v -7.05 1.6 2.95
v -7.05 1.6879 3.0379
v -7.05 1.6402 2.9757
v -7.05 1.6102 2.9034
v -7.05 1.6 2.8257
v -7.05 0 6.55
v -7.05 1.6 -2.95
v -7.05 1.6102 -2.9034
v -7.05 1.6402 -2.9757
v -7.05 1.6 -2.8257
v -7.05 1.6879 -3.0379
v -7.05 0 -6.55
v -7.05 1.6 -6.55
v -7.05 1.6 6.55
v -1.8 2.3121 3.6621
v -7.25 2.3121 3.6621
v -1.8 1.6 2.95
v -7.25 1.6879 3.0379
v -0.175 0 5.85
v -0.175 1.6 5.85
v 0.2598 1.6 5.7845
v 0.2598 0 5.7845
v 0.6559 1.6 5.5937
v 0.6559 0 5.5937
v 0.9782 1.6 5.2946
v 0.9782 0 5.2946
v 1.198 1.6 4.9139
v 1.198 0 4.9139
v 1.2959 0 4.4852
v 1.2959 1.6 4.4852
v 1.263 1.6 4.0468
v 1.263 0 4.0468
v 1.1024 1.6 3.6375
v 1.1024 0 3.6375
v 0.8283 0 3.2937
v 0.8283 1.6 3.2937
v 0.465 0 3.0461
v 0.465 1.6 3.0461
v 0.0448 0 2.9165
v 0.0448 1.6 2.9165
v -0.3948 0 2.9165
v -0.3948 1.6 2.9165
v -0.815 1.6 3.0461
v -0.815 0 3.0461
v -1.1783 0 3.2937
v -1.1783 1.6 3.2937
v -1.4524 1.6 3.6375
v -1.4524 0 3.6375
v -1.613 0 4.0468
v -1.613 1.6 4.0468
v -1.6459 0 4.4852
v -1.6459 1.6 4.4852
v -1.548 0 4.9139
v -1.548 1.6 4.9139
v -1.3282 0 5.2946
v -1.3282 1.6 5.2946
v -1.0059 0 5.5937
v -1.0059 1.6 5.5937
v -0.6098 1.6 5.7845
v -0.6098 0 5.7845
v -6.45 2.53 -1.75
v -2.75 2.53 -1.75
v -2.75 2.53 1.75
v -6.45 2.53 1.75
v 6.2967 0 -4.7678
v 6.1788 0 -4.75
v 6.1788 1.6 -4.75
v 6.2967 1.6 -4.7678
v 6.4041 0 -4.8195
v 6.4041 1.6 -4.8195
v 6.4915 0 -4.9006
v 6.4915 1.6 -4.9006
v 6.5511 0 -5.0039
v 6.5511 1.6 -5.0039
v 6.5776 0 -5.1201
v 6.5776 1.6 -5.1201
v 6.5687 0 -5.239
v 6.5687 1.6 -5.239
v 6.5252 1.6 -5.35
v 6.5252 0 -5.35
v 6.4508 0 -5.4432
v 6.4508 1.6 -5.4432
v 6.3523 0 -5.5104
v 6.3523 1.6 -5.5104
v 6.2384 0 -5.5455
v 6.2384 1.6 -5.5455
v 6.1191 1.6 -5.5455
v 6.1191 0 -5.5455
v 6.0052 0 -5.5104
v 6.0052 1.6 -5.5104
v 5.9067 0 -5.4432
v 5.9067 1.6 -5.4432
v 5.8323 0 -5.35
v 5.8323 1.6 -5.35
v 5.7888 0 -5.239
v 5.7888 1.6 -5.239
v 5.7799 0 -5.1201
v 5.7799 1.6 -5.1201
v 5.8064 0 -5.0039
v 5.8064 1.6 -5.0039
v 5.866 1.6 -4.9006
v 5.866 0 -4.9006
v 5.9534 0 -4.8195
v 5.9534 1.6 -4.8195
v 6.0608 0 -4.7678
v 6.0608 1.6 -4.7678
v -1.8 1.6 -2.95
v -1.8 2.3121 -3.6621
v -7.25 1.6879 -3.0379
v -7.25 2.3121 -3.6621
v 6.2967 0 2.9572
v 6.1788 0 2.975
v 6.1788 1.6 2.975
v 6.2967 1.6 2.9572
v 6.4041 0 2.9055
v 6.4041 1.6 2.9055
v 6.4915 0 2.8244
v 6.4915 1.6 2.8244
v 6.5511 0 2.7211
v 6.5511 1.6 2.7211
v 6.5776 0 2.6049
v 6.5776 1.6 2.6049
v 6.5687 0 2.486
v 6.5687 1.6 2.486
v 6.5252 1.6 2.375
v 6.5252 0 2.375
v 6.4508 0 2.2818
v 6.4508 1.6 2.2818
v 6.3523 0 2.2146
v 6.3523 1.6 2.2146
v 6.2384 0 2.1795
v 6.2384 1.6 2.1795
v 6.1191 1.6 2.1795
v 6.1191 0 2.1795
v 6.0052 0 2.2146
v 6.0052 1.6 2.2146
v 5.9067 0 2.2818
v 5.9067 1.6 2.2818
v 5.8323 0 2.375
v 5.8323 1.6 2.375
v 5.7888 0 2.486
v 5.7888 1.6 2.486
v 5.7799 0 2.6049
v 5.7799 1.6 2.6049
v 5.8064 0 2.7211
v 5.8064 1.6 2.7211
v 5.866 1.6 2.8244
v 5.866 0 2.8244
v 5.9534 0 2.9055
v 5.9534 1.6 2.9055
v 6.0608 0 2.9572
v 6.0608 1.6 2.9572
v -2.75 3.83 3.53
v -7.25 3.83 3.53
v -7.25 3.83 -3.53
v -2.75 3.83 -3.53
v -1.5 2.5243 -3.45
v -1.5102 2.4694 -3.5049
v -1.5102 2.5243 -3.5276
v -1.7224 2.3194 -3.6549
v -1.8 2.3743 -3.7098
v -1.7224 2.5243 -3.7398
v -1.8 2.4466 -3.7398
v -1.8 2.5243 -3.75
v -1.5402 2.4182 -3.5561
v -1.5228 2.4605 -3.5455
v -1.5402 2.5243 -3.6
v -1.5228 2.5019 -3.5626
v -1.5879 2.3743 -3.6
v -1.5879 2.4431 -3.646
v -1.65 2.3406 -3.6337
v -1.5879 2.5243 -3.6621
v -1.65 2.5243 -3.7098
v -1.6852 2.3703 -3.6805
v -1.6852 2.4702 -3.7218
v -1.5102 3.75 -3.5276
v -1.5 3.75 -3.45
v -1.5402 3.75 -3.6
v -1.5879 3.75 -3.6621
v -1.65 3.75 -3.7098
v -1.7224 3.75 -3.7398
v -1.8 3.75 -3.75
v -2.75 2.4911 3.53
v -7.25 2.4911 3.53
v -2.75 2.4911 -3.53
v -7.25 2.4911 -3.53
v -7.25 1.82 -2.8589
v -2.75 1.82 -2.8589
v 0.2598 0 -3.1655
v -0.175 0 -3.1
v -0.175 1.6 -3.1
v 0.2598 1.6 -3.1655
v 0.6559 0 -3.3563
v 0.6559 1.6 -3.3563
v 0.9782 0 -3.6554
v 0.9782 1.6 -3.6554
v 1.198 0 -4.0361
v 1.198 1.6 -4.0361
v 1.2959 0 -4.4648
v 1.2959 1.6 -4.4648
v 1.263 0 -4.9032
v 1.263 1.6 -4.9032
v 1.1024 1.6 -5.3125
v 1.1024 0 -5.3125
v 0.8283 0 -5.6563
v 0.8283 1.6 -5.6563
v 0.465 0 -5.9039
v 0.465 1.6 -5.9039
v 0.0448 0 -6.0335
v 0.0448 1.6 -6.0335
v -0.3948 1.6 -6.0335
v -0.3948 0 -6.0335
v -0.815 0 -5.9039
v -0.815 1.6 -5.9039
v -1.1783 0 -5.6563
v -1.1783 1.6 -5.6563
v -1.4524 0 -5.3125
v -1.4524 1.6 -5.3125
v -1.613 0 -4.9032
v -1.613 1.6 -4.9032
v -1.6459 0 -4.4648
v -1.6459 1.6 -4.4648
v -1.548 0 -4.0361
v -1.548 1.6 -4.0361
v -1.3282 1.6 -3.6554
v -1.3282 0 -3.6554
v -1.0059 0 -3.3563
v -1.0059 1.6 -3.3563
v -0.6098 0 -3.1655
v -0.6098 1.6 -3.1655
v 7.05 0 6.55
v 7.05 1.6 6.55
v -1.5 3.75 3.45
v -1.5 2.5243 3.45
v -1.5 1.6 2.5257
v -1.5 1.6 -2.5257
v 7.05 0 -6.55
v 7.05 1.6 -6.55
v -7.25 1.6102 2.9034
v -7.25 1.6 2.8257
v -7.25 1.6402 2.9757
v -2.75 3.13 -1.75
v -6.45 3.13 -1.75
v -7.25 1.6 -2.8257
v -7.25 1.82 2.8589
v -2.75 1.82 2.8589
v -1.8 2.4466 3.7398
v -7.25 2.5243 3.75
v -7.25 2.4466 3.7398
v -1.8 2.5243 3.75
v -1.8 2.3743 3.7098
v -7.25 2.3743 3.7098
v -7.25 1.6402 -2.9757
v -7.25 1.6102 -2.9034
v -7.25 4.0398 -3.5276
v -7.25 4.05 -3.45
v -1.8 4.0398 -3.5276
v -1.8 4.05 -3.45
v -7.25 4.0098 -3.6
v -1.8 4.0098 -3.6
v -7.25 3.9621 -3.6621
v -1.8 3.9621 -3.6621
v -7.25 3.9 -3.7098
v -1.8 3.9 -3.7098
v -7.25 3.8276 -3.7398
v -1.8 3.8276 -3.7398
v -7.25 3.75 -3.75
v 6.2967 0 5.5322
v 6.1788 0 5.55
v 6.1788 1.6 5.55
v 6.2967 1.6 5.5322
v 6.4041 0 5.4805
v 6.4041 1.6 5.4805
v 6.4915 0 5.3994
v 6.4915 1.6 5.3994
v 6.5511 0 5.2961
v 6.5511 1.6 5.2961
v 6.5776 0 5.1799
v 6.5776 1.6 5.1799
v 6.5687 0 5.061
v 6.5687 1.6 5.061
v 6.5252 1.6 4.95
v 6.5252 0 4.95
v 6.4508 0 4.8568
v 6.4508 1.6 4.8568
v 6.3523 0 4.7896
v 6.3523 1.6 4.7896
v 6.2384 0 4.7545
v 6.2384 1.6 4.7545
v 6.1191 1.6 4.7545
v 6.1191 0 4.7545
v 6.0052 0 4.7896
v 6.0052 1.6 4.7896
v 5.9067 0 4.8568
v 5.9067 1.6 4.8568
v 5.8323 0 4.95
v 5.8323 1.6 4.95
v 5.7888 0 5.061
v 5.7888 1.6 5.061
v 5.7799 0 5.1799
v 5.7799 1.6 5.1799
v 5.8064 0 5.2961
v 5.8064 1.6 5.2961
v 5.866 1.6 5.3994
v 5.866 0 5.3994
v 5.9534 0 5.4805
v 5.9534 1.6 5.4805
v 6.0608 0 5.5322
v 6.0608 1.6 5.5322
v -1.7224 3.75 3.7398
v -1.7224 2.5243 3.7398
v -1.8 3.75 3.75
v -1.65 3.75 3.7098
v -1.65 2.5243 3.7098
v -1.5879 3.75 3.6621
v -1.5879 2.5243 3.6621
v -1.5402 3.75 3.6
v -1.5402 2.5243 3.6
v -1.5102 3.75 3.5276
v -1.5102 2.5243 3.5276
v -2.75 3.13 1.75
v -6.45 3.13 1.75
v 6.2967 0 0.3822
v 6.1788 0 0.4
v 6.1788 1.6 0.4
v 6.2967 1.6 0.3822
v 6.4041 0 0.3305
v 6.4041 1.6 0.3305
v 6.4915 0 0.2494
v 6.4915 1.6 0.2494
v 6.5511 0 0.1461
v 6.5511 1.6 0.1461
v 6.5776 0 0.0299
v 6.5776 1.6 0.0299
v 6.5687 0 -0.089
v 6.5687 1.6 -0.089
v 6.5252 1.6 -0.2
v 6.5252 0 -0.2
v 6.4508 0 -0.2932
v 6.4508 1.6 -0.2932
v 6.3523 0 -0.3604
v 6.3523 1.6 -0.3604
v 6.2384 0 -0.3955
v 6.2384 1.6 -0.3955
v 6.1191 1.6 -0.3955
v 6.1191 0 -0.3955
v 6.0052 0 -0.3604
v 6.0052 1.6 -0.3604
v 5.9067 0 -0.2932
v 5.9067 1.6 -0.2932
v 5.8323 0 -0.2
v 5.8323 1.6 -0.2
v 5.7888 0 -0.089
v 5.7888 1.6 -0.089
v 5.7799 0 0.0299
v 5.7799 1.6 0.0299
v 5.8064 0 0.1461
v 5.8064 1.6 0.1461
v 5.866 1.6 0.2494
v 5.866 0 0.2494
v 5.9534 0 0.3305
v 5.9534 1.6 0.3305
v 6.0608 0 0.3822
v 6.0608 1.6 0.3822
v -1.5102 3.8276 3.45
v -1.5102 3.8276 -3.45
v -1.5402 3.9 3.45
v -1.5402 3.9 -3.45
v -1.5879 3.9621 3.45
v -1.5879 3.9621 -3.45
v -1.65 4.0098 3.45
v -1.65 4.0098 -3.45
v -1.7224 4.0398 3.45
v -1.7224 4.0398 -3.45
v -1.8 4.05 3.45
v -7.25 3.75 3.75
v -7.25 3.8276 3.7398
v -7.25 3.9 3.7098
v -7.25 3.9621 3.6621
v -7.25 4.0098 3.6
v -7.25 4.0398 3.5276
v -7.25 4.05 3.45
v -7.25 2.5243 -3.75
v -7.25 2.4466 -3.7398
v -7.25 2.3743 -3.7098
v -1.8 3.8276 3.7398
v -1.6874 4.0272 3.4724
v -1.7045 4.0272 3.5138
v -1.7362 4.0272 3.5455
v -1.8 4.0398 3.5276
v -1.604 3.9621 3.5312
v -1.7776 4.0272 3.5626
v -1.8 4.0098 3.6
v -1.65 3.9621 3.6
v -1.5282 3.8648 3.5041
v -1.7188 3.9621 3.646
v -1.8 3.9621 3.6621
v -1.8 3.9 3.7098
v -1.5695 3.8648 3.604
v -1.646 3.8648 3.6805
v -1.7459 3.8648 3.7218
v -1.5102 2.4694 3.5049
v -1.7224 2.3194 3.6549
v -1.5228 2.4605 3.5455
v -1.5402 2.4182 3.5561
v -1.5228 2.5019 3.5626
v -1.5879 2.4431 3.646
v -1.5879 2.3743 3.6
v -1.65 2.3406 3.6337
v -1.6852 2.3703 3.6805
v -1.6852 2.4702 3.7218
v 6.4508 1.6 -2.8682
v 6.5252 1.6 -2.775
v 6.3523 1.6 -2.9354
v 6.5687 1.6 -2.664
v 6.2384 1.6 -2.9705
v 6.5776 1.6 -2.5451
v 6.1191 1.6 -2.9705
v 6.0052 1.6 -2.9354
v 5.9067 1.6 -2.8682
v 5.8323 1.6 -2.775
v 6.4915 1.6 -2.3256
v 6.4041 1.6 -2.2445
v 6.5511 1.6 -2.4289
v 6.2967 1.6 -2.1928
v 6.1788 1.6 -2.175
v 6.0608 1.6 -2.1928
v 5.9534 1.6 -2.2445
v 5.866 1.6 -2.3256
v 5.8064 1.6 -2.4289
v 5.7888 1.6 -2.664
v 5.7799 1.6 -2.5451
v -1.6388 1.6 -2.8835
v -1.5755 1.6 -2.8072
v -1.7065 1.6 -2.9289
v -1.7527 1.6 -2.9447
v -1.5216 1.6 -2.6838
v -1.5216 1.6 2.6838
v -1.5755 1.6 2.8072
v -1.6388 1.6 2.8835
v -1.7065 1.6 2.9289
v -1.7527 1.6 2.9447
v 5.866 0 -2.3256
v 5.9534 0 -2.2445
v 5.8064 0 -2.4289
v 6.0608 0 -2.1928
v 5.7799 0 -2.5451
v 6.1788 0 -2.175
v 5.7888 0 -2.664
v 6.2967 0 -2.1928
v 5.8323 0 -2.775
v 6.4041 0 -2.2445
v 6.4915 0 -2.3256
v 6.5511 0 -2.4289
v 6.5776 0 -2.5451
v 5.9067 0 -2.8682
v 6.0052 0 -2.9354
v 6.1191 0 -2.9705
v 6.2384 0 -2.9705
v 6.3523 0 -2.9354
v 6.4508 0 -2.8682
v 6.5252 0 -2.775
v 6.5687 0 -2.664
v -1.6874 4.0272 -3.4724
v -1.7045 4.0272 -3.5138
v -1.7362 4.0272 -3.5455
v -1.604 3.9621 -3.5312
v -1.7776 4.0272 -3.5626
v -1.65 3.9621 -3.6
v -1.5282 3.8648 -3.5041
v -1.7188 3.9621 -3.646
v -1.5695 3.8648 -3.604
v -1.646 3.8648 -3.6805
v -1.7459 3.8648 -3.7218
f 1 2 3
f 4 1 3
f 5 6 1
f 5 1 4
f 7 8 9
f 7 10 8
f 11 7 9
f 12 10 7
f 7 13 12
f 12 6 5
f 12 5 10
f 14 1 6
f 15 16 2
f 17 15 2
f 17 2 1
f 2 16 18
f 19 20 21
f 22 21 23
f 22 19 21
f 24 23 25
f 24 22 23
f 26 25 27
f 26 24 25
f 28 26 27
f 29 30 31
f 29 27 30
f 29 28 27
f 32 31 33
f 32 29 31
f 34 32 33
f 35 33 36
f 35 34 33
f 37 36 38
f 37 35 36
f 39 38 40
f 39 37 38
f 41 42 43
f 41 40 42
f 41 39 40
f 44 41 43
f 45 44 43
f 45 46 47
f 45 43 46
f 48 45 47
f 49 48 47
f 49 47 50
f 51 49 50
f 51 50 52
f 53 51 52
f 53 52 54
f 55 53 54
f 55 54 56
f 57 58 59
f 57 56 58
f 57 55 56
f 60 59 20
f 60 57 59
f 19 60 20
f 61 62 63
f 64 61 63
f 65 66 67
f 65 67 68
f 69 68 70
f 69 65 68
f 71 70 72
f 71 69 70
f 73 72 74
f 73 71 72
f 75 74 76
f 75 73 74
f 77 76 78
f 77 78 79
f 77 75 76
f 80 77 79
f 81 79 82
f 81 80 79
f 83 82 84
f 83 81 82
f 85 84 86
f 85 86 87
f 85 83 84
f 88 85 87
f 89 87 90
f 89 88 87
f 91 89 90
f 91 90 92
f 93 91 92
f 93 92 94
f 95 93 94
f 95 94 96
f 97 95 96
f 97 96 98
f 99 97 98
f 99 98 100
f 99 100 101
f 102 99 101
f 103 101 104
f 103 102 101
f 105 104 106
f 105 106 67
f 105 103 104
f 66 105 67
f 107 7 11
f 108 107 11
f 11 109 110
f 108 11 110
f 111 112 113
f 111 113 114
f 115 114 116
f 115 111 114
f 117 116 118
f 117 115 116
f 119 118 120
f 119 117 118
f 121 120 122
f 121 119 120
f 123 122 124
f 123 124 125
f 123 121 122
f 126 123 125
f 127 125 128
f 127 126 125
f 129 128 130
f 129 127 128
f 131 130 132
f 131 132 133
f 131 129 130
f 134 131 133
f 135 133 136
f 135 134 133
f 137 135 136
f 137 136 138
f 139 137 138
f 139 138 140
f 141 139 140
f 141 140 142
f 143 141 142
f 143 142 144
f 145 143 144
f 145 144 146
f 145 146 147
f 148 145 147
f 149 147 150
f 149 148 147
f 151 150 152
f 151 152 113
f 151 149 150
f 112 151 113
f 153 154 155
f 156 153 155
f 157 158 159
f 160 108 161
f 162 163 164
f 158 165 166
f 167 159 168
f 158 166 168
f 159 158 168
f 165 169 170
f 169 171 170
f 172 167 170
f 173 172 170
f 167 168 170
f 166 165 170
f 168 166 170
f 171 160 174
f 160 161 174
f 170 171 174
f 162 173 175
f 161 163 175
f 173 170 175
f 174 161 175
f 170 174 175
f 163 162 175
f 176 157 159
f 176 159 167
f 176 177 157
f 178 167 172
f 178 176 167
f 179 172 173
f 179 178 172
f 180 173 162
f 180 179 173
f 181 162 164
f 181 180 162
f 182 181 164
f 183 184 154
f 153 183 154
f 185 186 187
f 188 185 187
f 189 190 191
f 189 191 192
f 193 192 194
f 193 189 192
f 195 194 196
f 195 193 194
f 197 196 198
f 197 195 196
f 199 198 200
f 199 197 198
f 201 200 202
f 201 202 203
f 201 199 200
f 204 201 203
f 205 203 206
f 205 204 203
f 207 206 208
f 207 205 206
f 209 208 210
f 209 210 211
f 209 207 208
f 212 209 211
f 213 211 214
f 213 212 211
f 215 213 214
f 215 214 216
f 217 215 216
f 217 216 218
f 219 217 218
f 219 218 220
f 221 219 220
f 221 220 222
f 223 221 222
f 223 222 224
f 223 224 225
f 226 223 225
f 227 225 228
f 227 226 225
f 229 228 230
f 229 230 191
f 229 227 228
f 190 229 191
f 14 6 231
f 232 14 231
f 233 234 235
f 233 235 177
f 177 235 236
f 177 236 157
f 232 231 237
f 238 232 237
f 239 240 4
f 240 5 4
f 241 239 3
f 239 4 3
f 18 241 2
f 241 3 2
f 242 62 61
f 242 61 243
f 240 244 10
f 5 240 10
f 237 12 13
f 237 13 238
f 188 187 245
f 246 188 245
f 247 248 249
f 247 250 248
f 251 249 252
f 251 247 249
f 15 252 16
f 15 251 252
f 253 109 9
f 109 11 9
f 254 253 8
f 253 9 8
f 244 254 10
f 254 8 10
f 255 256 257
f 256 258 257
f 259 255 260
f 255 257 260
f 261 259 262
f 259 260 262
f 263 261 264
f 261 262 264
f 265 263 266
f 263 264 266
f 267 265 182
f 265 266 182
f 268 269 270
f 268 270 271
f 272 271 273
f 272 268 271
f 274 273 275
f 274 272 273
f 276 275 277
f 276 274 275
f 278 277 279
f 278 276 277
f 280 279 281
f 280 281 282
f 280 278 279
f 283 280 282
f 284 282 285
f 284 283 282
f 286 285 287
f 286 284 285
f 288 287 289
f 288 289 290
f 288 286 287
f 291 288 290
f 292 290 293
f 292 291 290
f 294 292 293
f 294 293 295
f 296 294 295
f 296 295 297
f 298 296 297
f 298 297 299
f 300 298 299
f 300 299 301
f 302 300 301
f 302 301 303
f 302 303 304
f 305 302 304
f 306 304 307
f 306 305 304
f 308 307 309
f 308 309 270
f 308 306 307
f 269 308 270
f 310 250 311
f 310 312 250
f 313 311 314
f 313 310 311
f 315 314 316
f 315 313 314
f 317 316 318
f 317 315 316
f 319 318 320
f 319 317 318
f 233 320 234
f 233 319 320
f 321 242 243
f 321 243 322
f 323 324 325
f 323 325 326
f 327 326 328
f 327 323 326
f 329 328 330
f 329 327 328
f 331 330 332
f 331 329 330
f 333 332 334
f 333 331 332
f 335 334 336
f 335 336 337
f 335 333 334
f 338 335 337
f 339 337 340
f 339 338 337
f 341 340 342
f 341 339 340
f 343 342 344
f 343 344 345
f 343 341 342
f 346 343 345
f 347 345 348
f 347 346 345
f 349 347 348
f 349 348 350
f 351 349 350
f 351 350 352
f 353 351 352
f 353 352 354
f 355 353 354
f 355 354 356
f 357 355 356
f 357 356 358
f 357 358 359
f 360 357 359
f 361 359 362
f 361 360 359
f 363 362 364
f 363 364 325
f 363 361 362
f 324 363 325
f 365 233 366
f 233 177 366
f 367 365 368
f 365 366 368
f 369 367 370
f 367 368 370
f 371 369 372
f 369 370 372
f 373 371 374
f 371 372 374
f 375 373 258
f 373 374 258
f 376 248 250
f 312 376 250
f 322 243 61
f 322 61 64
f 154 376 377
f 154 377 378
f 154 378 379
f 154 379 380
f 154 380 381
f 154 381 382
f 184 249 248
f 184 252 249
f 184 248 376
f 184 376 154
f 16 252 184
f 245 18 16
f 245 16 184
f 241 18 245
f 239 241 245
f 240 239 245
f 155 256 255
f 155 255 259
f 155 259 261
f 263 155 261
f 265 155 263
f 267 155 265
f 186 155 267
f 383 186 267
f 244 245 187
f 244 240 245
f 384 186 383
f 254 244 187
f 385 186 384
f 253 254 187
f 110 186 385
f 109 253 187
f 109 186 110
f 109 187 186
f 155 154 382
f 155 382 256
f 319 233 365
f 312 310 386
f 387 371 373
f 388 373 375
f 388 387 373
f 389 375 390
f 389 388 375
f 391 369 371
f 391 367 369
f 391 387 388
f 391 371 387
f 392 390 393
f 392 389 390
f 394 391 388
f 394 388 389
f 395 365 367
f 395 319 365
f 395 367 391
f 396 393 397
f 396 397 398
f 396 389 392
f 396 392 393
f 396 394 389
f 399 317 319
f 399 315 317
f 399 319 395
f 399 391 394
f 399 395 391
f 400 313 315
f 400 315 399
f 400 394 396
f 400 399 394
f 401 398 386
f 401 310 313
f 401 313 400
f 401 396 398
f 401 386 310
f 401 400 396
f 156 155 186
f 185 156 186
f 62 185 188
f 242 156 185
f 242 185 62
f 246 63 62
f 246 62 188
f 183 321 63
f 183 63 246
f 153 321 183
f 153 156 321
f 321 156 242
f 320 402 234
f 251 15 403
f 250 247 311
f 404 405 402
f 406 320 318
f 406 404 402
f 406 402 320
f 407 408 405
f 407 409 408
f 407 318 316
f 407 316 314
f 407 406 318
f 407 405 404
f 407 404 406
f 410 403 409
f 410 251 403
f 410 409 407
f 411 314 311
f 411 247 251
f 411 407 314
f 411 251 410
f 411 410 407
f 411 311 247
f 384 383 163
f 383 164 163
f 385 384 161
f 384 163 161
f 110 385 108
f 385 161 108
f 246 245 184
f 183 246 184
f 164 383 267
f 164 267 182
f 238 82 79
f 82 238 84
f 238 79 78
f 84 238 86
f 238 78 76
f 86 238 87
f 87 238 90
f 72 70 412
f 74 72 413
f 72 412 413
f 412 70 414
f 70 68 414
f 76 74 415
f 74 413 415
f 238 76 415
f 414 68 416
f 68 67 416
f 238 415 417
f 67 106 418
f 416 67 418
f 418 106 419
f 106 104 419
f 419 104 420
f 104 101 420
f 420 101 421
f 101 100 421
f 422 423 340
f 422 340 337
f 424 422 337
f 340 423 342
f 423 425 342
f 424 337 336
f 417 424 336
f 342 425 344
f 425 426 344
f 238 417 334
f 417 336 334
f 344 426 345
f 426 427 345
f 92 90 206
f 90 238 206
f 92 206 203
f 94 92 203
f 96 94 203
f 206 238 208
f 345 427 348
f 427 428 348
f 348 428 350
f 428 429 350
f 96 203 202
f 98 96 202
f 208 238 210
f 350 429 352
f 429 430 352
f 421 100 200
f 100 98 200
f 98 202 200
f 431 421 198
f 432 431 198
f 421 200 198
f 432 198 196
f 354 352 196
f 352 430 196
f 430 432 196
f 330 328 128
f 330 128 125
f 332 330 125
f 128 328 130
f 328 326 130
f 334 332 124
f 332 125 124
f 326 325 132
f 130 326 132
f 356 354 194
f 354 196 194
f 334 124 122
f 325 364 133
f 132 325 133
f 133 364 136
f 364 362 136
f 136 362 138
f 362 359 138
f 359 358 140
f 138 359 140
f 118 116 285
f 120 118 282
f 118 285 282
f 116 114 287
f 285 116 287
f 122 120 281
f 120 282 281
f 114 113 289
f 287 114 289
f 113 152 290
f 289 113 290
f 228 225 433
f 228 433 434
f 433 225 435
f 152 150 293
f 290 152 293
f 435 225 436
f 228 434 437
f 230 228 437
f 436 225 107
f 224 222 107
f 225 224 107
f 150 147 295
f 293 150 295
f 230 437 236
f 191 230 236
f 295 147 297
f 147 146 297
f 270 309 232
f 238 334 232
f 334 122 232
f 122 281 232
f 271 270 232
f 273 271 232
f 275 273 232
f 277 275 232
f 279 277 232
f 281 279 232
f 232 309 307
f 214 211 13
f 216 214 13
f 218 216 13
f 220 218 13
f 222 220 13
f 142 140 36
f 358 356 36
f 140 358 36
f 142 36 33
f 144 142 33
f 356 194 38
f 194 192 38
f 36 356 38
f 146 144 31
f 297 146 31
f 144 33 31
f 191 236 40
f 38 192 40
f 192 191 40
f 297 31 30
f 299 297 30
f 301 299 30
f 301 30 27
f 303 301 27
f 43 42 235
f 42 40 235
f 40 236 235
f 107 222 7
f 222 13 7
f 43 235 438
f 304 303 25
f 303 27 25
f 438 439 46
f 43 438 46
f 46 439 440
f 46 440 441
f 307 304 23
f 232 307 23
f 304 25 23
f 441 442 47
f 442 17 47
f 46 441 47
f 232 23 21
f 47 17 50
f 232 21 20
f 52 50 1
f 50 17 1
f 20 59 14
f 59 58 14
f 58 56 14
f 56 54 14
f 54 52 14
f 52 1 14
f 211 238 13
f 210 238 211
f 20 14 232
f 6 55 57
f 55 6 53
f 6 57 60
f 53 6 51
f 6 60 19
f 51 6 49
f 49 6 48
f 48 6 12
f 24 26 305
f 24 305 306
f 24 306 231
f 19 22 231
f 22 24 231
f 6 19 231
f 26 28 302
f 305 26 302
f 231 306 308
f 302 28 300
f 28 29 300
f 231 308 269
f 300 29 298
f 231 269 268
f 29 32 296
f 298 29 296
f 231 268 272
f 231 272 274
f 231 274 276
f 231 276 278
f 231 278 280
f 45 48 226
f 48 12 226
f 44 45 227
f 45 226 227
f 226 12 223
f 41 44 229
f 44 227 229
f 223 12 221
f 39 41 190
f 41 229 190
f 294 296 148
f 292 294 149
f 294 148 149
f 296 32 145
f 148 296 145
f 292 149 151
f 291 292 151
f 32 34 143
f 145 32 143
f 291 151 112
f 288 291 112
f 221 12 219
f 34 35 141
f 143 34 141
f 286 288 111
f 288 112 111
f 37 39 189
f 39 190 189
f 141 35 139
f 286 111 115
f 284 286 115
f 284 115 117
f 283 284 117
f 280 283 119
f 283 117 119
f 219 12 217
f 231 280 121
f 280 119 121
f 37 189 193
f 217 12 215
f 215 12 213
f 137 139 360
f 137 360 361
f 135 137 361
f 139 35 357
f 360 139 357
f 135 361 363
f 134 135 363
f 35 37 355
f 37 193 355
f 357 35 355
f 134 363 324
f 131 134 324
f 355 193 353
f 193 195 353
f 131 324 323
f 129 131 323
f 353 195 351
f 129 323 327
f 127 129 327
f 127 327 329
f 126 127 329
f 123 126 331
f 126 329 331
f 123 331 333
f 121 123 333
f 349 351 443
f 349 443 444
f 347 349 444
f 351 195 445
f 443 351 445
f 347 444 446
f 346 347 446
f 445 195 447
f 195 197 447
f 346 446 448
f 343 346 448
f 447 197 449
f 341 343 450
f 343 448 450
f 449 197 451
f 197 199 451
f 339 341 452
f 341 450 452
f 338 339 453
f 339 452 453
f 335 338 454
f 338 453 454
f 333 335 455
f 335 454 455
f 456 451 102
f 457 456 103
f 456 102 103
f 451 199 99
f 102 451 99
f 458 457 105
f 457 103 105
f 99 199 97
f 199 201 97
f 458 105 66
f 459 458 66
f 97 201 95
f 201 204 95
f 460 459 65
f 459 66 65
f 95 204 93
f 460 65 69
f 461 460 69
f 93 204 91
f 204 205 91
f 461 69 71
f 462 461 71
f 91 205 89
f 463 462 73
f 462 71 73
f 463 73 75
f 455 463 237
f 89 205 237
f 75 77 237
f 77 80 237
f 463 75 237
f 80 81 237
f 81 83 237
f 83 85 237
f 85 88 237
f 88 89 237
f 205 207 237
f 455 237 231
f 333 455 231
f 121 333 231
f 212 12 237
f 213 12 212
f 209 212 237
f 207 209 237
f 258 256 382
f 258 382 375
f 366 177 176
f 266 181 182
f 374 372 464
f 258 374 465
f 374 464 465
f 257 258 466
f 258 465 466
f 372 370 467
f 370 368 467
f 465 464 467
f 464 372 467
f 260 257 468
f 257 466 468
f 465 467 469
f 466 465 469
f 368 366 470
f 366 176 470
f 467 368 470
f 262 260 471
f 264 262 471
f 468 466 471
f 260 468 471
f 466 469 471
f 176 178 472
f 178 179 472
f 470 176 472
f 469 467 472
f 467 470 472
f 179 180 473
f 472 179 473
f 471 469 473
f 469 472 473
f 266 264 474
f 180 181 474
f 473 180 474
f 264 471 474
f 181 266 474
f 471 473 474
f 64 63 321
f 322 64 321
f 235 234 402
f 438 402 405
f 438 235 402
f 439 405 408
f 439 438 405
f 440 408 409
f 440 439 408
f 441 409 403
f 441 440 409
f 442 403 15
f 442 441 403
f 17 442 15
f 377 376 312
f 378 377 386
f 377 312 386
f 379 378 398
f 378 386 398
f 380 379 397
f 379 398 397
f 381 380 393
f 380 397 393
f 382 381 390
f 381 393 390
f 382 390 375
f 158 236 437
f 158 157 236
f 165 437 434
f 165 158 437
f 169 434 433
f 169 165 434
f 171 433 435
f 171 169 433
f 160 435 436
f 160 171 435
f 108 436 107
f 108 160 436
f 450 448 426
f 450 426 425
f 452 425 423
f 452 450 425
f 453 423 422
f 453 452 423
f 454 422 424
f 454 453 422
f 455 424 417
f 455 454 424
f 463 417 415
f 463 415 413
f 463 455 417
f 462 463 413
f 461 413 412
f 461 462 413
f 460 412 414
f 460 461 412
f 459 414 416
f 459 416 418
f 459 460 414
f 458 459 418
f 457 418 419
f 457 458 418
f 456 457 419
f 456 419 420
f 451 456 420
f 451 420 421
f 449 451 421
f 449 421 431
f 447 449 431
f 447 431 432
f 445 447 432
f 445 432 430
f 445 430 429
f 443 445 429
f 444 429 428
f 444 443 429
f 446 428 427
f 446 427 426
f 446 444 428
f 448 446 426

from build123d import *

# Parameters (mm, degrees)
ESQUISSE1_W             = 14.1
ESQUISSE1_H             = 13.1
ESQUISSE1_R             = 1.475
ESQUISSE1_R_2           = 0.4
BOSS_EXTRU_1_DEPTH      = 1.6
ESQUISSE2_W             = 5.75
ESQUISSE2_H             = 7.5
BOSS_EXTRU_2_DEPTH      = 2.45
ENL_V_MAT_EXTRU_1_DEPTH = 5.75
CONG_1_R                = 0.3
ENL_V_MAT_EXTRU_2_DEPTH = 4.5
ESQUISSE5_W             = 3.5
ESQUISSE5_H             = 0.6
BOSS_EXTRU_3_DEPTH      = 3.7


with BuildPart() as part:
    # Esquisse1 → Boss.-Extru.1 (new body)
    with BuildSketch(Plane(origin=(0, 0, 0), x_dir=(1, 0, 0), z_dir=(0, 1, 0))):
        Rectangle(ESQUISSE1_W, ESQUISSE1_H)
        with Locations(Location((-0.175, -4.375, 0), (0, 0, 270))):
            Circle(ESQUISSE1_R, mode=Mode.SUBTRACT)
        with Locations(Location((-0.175, 4.575, 0), (0, 0, 270))):
            Circle(ESQUISSE1_R, mode=Mode.SUBTRACT)
        with Locations(Location((6.178751871, -5.15, 0), (0, 0, 270))):
            Circle(ESQUISSE1_R_2, mode=Mode.SUBTRACT)
        with Locations(Location((6.178751871, -2.575, 0), (0, 0, 270))):
            Circle(ESQUISSE1_R_2, mode=Mode.SUBTRACT)
        with Locations(Location((6.178751871, 0, 0), (0, 0, 270))):
            Circle(ESQUISSE1_R_2, mode=Mode.SUBTRACT)
        with Locations(Location((6.178751871, 2.575, 0), (0, 0, 270))):
            Circle(ESQUISSE1_R_2, mode=Mode.SUBTRACT)
        with Locations(Location((6.178751871, 5.15, 0), (0, 0, 270))):
            Circle(ESQUISSE1_R_2, mode=Mode.SUBTRACT)
    extrude(amount=BOSS_EXTRU_1_DEPTH)

    # Esquisse2 → Boss.-Extru.2 (add)
    with BuildSketch(Plane(origin=(0, 1.6, 0), x_dir=(1, 0, 0), z_dir=(0, 1, 0))):
        with Locations((-4.375, 0)):
            Rectangle(ESQUISSE2_W, ESQUISSE2_H)
    extrude(amount=BOSS_EXTRU_2_DEPTH)

    # Esquisse3 → Enlèv. mat.-Extru.1 (cut)
    with BuildSketch(Plane.ZY.offset(7.25)):
        Polygon((-3.75, 1.6), (-2.95, 1.6), (-3.75, 2.4), align=None)
        Polygon((2.95, 1.6), (3.75, 1.6), (3.75, 2.4), align=None)
    extrude(amount=-ENL_V_MAT_EXTRU_1_DEPTH, mode=Mode.SUBTRACT)

    # Congé1
    cong_1_edges = [part.edges().sort_by_distance(p)[0] for p in [
        (-1.5, 2, 3.35),
        (-1.5, 3.225, 3.75),
        (-1.5, 2, -3.35),
        (-1.5, 3.225, -3.75),
        (-1.5, 4.05, 0),
        (-7.15, 1.6, 2.95),
        (-7.15, 1.6, -2.95),
        (-4.375, 2.4, -3.75),
        (-4.375, 2.4, 3.75),
        (-4.375, 4.05, -3.75),
        (-4.375, 4.05, 3.75),
    ]]
    fillet(cong_1_edges, radius=CONG_1_R)

    # Esquisse4 → Enlèv. mat.-Extru.2 (cut)
    with BuildSketch(Plane.ZY.offset(7.25)):
        Polygon((-3.53, 3.83), (-3.53, 2.491126984), (-2.858873016, 1.82), (2.858873016, 1.82), (3.53, 2.491126984), (3.53, 3.83), align=None)
    extrude(amount=-ENL_V_MAT_EXTRU_2_DEPTH, mode=Mode.SUBTRACT)

    # Esquisse5 → Boss.-Extru.3 (add)
    with BuildSketch(Plane.ZY.offset(2.75)):
        with Locations((0, 2.83)):
            Rectangle(ESQUISSE5_W, ESQUISSE5_H)
    extrude(amount=BOSS_EXTRU_3_DEPTH)


solid = part.part
